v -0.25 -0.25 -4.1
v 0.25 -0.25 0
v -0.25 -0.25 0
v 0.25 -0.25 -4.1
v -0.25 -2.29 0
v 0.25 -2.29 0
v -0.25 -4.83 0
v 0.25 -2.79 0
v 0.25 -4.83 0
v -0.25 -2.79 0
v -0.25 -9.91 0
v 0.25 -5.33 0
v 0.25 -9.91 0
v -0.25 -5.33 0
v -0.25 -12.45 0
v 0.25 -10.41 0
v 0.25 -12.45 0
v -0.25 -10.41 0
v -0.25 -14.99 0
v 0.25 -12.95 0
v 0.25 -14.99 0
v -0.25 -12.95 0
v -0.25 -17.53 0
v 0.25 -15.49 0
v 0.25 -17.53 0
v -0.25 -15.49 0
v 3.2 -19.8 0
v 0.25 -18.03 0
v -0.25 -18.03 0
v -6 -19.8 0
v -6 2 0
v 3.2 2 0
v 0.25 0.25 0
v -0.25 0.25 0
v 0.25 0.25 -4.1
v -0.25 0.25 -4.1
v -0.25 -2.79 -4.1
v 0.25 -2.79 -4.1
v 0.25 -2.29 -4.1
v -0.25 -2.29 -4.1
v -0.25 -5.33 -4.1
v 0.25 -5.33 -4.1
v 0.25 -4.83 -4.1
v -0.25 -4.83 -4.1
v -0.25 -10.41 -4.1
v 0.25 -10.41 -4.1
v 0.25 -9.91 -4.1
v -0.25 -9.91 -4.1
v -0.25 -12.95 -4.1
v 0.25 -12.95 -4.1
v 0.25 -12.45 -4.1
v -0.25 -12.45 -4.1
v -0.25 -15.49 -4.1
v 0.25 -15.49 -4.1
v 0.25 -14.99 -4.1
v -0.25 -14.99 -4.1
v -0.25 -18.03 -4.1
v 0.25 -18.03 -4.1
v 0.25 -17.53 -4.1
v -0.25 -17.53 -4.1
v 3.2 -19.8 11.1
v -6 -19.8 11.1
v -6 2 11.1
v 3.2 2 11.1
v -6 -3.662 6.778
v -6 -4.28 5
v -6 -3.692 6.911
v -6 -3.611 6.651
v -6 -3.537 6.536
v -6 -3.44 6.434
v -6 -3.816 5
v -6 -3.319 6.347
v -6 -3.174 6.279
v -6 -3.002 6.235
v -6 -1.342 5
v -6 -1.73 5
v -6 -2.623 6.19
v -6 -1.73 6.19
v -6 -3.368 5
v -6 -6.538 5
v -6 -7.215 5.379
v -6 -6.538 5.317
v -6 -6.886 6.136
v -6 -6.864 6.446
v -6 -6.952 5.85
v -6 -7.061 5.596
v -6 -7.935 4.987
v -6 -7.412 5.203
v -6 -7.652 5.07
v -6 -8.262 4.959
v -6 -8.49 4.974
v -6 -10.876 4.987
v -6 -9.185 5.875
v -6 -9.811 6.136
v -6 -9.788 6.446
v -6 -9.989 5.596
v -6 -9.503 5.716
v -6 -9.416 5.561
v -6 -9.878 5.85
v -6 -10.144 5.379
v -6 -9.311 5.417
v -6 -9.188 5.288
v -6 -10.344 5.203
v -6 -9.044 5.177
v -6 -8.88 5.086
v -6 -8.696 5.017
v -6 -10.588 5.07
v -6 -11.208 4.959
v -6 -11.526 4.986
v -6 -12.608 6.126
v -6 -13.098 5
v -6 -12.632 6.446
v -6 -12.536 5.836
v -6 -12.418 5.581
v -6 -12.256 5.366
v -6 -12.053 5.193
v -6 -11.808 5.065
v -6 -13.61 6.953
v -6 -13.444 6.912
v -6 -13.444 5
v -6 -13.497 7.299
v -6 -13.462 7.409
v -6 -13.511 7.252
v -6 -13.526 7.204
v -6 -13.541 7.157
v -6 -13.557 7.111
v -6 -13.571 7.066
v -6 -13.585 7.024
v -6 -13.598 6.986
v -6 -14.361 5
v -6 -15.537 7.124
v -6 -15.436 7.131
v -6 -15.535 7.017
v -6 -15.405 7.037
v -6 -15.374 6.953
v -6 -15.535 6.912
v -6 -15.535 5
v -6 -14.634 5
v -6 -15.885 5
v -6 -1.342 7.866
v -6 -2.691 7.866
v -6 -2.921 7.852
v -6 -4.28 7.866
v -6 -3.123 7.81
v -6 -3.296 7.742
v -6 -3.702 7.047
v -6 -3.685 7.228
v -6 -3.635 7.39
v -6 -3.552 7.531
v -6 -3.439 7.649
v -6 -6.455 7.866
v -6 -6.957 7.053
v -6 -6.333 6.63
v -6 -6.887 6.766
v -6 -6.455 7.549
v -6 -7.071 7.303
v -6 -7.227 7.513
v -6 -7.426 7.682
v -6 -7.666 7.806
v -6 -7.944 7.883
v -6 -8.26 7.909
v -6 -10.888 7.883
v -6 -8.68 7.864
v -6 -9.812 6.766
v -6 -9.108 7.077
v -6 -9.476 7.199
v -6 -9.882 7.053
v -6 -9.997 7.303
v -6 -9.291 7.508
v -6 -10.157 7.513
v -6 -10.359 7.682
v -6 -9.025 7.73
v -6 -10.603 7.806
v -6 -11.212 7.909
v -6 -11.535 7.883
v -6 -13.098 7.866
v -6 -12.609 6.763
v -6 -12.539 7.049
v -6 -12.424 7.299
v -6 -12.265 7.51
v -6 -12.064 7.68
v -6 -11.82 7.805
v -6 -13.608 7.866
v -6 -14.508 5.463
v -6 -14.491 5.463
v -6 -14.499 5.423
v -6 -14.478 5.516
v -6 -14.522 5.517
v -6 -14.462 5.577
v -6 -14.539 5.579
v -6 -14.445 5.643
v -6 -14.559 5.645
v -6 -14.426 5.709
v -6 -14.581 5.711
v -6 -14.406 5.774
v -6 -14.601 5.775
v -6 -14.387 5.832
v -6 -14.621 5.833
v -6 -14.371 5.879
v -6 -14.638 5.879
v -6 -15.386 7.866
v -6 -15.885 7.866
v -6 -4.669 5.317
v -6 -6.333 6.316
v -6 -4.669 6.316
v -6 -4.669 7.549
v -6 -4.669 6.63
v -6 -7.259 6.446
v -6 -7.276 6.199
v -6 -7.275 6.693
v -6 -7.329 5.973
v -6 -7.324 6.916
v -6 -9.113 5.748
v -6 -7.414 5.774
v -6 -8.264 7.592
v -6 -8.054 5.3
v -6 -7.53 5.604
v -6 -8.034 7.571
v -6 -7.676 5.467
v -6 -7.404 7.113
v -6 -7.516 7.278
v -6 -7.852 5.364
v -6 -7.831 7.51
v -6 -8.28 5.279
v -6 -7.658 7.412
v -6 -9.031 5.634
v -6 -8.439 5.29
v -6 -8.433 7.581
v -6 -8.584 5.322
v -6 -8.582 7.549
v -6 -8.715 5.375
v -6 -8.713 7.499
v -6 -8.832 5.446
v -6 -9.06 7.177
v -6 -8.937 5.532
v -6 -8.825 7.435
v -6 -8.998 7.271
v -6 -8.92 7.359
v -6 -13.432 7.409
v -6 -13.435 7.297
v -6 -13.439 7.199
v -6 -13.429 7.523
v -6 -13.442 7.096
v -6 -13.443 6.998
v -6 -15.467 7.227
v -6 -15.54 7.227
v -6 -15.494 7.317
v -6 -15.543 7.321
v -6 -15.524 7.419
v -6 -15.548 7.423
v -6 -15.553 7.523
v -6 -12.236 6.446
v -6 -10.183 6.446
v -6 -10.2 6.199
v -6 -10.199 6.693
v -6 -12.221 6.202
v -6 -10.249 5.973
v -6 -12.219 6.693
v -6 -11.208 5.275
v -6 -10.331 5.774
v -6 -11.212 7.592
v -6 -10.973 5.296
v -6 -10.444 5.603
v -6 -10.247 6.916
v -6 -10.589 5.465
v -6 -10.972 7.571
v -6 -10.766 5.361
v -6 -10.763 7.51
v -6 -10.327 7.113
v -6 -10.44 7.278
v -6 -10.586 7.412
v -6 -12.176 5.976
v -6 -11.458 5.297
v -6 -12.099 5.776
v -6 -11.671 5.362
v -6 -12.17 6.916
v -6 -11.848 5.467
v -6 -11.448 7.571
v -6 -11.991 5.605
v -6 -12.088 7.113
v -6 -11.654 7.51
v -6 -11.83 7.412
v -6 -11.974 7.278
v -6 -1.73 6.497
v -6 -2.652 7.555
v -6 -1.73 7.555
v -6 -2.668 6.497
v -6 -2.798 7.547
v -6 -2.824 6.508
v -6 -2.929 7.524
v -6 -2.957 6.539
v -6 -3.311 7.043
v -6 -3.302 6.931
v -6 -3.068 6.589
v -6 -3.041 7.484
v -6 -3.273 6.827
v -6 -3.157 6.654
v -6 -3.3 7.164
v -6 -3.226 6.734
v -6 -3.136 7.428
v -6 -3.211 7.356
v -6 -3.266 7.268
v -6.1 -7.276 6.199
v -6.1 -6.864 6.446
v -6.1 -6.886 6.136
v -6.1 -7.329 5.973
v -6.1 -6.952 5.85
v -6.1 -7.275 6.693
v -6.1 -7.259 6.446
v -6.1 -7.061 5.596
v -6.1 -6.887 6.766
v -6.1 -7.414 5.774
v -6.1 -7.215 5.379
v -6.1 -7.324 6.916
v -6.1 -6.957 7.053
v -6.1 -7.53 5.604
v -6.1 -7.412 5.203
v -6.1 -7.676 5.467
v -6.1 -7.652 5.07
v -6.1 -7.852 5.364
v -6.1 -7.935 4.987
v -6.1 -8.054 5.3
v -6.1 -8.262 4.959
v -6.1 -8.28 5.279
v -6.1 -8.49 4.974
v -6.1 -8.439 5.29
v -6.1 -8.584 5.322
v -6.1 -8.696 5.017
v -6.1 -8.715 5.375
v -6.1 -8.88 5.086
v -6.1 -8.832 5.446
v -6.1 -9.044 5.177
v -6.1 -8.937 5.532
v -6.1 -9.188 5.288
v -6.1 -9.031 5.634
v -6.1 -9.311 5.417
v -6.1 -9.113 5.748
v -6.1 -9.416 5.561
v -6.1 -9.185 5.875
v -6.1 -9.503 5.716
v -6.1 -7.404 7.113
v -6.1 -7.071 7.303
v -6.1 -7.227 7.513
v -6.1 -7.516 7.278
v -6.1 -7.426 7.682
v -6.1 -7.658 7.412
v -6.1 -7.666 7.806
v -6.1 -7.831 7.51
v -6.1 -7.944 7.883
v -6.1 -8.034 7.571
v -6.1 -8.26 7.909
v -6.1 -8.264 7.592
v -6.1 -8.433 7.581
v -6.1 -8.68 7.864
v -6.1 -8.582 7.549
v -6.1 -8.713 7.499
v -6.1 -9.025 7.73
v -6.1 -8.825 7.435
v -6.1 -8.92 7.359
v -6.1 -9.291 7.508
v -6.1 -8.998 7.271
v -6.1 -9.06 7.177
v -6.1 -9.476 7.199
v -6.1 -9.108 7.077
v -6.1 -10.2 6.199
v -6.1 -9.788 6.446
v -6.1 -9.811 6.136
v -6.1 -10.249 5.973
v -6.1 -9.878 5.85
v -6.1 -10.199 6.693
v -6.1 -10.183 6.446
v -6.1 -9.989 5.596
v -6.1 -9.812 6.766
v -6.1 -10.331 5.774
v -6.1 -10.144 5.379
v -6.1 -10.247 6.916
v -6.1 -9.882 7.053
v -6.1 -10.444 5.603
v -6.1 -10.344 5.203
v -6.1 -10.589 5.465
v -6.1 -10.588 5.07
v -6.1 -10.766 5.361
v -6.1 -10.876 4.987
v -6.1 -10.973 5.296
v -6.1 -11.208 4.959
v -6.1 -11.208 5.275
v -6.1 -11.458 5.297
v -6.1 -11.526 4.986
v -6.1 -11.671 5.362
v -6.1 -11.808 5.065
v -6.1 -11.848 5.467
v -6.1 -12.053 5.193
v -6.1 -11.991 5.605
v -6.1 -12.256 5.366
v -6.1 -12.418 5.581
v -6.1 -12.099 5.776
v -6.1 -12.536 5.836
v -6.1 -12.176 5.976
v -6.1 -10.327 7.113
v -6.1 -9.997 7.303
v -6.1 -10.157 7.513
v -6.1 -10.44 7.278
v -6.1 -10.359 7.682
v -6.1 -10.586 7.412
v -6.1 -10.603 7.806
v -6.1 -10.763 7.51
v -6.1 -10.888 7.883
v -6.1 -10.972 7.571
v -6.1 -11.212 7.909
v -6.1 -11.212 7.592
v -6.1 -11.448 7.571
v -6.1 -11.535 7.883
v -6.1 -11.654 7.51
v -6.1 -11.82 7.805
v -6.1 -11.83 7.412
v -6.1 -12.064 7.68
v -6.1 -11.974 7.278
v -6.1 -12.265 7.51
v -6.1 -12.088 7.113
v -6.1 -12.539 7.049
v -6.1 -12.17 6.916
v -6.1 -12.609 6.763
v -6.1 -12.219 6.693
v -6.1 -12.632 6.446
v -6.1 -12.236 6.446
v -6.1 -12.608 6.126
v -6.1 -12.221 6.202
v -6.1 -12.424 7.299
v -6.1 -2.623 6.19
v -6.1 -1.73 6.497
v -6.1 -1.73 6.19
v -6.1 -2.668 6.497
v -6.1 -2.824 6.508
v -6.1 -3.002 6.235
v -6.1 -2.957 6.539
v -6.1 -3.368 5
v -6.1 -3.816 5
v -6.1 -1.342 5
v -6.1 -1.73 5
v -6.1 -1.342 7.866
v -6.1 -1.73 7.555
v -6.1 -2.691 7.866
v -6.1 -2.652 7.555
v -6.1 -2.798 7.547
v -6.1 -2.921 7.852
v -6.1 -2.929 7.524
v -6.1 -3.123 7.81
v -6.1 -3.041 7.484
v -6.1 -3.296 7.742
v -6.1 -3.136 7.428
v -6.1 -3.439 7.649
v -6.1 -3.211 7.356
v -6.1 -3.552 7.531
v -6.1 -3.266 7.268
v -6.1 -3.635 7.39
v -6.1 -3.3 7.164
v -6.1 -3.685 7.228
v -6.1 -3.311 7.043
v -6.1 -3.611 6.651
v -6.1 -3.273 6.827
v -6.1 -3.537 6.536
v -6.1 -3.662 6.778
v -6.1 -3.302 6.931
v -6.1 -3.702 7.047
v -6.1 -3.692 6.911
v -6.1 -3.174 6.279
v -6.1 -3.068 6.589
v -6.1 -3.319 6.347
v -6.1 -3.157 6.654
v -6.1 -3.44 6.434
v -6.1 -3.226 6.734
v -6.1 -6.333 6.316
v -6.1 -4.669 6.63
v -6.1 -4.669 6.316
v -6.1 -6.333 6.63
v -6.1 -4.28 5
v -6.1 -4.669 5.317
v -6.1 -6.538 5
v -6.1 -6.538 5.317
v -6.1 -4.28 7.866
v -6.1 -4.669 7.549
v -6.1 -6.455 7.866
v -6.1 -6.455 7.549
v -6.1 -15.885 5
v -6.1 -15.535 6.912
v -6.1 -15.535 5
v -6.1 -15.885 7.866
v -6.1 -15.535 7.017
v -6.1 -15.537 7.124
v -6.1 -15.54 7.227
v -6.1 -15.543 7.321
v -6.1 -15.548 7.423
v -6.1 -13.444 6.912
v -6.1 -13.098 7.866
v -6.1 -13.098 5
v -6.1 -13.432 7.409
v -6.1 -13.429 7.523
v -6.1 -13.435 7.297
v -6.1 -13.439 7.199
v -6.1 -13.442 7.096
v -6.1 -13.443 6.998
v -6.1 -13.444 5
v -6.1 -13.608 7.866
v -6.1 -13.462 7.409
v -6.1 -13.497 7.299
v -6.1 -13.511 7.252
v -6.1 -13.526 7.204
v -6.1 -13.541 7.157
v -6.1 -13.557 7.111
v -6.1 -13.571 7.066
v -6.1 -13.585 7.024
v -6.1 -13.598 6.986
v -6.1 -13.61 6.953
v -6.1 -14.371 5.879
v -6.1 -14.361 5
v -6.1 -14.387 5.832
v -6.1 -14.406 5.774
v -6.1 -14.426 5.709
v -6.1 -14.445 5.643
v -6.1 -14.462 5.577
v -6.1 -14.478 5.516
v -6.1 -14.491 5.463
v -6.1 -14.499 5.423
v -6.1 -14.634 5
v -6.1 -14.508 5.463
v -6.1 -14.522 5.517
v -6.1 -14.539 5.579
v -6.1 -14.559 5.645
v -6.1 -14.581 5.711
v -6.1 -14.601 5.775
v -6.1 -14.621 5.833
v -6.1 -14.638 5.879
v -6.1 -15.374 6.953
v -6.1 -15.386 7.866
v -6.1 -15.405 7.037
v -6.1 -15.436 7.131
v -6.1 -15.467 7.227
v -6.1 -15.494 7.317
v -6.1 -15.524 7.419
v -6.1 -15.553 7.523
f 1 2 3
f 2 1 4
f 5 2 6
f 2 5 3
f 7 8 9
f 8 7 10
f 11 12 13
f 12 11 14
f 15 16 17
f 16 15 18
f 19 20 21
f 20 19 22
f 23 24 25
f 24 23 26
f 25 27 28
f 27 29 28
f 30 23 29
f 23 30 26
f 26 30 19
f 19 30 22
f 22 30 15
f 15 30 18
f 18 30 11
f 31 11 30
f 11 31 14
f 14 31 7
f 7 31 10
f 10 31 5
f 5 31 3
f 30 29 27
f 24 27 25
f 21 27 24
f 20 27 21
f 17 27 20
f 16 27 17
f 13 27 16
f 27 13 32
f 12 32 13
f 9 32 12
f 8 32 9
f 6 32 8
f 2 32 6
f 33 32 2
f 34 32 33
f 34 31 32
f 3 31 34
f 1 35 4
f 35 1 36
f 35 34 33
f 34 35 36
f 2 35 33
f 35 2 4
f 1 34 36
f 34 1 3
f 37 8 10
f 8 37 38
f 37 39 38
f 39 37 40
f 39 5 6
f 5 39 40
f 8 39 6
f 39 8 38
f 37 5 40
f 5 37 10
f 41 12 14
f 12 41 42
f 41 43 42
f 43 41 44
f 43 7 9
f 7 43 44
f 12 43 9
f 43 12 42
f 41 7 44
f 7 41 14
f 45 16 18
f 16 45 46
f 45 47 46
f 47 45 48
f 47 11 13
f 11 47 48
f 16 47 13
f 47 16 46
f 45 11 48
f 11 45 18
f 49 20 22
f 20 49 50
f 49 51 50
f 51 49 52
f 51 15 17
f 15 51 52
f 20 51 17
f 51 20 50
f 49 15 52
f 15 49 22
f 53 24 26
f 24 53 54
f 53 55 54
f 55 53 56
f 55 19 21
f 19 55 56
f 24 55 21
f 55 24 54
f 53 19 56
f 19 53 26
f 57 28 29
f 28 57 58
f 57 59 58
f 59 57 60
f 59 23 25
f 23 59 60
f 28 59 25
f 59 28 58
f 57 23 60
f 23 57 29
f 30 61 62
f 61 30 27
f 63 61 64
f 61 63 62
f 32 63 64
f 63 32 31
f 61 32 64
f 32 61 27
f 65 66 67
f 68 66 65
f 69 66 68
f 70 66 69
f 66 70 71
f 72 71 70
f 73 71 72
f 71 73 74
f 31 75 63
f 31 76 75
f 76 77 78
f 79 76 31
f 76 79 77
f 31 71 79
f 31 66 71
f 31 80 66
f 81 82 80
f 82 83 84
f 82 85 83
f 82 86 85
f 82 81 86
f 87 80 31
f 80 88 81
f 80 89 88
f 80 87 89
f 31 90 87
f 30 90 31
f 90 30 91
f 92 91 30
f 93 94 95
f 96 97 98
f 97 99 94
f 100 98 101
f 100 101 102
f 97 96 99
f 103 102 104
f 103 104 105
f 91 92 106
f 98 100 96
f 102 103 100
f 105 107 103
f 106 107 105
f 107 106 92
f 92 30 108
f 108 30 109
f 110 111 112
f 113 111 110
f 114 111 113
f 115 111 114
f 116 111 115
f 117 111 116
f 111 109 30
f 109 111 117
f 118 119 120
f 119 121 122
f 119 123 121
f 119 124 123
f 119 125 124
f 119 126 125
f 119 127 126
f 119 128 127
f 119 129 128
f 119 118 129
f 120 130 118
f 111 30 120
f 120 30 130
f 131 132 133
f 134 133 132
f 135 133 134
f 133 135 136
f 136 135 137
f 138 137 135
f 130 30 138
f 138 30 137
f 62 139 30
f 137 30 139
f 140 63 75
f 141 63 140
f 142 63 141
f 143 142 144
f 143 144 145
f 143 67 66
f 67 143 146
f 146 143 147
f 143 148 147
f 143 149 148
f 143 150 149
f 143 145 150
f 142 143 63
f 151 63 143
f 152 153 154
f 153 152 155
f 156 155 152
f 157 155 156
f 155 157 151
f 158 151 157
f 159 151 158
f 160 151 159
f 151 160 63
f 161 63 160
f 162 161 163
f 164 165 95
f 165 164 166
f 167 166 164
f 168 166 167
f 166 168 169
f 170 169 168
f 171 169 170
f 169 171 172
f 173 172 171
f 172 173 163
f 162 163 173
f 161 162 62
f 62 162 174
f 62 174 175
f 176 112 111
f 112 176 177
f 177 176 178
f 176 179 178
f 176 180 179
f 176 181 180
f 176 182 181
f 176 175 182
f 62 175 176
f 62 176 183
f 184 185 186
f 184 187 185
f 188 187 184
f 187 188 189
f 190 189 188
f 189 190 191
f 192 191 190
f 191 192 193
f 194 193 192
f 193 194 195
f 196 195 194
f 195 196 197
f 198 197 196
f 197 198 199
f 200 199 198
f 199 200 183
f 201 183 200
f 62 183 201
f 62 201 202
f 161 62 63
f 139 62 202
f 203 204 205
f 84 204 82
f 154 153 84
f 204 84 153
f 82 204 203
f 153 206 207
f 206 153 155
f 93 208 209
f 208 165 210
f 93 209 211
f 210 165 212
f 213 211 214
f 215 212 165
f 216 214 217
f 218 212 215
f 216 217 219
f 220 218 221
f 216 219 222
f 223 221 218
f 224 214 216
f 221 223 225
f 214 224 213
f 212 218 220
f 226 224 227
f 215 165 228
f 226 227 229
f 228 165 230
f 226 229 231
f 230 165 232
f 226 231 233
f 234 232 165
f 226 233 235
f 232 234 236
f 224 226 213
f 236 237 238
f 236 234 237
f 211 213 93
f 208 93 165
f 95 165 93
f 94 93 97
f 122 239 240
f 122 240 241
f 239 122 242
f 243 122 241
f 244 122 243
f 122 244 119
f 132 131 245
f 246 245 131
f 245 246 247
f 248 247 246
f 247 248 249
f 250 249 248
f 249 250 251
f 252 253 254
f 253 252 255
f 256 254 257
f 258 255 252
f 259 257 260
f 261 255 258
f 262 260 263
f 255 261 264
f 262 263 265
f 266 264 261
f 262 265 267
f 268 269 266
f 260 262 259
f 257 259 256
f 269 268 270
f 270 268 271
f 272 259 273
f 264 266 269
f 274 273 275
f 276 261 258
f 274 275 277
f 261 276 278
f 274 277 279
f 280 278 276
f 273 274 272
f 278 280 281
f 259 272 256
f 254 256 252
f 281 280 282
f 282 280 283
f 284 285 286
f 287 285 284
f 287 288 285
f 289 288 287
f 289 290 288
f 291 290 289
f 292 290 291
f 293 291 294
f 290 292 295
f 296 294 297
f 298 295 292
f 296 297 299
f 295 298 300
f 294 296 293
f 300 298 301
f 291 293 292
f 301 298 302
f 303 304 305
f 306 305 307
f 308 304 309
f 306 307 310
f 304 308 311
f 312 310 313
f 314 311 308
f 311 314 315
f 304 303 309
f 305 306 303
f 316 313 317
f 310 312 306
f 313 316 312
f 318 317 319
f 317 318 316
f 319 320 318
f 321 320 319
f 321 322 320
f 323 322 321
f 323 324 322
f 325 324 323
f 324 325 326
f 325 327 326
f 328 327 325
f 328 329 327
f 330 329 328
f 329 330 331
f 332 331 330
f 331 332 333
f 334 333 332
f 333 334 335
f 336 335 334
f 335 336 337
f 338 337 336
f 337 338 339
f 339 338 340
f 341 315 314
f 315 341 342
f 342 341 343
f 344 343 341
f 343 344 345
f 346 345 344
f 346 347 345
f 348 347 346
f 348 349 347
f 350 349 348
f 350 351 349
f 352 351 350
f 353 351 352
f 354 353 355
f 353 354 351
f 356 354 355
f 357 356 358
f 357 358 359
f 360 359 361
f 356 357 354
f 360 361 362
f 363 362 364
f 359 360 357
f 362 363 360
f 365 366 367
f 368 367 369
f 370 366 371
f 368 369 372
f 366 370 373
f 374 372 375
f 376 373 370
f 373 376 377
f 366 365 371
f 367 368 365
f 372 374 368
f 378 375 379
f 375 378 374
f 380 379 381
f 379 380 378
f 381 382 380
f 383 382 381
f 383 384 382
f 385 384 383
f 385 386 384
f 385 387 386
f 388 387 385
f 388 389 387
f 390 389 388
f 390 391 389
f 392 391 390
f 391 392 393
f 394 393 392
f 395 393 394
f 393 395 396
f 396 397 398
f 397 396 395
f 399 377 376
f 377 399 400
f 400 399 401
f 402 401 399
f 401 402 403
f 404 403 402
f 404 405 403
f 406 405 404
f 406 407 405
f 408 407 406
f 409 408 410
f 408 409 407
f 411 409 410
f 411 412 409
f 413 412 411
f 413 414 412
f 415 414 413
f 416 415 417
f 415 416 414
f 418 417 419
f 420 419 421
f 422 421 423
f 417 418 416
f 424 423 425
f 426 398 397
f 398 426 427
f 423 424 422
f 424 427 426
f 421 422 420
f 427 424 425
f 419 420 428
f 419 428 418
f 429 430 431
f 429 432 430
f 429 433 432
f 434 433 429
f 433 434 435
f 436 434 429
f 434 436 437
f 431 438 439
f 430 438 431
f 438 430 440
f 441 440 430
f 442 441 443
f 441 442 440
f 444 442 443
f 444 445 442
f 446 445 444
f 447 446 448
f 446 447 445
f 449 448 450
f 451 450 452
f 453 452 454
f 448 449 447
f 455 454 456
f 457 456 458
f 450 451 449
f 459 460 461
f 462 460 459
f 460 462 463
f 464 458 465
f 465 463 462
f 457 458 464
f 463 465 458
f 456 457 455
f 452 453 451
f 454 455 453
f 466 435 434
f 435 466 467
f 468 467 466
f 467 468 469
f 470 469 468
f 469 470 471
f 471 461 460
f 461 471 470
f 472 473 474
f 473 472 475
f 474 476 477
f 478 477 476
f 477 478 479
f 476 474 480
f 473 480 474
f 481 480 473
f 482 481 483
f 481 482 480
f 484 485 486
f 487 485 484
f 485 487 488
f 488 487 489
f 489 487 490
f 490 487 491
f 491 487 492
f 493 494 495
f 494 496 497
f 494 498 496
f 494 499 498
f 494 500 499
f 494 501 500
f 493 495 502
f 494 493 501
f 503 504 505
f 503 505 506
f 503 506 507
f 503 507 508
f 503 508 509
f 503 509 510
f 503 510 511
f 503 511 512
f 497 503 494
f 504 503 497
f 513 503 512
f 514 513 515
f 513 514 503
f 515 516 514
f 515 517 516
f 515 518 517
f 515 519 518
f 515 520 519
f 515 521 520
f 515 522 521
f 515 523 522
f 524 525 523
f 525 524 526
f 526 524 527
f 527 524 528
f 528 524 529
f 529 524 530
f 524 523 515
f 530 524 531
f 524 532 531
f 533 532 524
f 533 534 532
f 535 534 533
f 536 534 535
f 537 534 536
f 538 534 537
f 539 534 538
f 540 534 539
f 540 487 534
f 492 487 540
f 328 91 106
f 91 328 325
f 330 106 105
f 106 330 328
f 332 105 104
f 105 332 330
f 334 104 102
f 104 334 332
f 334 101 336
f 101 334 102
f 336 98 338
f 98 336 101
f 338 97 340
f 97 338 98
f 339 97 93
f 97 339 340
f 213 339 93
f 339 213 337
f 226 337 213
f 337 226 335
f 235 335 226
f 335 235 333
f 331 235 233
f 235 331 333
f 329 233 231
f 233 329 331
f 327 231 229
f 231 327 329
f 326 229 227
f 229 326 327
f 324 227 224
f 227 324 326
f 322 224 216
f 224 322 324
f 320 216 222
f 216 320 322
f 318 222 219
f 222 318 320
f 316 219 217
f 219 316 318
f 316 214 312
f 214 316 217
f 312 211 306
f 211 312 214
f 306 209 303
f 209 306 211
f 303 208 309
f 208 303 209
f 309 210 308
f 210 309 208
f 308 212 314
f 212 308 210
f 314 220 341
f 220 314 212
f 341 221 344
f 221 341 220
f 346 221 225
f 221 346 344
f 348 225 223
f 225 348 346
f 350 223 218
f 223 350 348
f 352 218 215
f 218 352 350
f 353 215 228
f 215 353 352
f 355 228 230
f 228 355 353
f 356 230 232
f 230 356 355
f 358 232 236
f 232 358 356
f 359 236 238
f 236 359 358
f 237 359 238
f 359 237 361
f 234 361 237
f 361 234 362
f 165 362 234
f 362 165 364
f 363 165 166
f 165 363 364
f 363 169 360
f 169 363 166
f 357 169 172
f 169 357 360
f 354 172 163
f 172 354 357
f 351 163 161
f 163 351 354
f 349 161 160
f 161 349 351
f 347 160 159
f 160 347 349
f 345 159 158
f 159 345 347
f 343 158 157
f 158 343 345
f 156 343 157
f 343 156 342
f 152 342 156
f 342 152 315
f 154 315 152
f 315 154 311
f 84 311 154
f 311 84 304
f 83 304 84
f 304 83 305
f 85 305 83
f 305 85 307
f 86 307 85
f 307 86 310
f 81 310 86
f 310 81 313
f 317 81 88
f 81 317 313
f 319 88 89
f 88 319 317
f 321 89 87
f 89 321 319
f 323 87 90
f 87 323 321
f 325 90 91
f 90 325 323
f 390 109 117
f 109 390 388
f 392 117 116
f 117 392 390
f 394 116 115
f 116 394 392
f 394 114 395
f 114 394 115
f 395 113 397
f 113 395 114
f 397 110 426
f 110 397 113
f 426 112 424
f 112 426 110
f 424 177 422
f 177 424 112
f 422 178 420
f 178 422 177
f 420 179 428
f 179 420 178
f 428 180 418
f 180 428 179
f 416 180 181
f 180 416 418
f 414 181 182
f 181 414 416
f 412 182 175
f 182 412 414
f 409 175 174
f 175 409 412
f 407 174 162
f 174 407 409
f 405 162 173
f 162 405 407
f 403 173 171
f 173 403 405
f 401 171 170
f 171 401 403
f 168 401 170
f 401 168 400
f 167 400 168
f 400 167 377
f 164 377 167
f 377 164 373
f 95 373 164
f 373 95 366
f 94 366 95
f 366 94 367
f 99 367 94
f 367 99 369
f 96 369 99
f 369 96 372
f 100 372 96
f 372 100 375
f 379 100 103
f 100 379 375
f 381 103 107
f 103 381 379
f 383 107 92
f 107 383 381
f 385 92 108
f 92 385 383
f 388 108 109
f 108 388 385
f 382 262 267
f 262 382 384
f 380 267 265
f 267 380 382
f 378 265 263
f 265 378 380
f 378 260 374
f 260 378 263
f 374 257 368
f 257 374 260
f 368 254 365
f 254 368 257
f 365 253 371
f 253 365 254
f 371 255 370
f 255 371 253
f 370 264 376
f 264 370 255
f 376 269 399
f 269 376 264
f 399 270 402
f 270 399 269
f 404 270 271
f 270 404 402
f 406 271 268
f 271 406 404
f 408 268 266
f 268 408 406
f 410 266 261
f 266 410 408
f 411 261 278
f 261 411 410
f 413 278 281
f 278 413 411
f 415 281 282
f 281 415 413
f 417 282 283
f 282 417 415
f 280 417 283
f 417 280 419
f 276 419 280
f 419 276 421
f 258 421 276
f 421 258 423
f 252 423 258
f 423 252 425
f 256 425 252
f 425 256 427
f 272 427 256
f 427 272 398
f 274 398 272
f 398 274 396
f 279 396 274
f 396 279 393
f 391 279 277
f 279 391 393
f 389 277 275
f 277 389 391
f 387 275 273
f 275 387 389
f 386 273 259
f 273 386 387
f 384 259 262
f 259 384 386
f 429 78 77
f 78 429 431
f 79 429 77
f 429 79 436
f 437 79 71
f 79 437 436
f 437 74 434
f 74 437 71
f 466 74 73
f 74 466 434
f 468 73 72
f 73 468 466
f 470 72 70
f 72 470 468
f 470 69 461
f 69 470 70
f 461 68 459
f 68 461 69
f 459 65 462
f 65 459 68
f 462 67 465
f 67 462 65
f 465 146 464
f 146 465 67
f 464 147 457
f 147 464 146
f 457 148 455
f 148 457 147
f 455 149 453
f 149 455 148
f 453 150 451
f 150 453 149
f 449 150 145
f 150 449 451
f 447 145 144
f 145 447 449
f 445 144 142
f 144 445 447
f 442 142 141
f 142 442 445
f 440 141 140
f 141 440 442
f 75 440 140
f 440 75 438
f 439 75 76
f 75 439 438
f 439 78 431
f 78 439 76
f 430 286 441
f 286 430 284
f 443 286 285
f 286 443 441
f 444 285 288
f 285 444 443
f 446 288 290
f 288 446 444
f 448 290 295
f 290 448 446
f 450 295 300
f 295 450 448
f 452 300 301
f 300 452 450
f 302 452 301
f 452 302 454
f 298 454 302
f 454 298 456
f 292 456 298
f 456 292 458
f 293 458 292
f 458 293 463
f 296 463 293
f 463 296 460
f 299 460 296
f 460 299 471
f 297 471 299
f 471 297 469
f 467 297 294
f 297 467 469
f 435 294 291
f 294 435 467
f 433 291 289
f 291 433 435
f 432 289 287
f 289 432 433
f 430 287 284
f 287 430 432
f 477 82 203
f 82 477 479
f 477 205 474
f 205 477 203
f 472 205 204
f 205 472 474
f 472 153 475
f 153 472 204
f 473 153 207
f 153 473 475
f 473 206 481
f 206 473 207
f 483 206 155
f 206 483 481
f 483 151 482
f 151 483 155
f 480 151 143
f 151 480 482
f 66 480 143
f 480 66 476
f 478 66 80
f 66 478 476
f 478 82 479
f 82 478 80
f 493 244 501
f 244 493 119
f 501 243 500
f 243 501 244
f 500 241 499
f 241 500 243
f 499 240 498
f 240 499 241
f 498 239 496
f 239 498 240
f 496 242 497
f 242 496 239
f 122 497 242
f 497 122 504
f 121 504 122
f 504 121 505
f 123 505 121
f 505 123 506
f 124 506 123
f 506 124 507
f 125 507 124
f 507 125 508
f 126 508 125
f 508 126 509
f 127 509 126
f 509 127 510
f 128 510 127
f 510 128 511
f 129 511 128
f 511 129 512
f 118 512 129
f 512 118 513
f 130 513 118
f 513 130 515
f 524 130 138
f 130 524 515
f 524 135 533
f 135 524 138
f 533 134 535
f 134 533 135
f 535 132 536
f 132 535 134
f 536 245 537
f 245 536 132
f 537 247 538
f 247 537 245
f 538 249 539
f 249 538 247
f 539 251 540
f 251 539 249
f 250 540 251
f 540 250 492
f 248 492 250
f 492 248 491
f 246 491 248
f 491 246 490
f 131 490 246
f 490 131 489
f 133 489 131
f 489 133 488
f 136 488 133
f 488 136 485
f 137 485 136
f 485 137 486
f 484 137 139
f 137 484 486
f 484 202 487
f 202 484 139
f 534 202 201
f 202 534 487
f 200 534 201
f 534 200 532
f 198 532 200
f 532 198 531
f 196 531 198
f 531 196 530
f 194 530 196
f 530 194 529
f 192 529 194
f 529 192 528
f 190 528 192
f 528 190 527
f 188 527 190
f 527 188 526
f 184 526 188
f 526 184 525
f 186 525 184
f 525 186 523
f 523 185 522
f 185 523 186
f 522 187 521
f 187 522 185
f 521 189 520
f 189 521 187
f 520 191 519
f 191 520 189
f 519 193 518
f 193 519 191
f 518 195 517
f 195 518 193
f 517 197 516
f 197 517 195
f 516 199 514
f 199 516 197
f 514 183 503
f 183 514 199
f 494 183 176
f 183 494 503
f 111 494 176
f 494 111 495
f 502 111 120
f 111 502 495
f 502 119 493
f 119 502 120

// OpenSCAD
module pin(n) {
    translate([2.54*(n-1), 0, 0])translate([-0.25,-0.25,-4.1])cube([0.5,0.5,4.1]);
}

rotate([0,0,-90])
{
    color("darkgrey")translate([-2,-9.2+3.2,0])cube([21.8, 9.2, 11.1]);
    color("white")translate([1,-9.2+3.2+0.9,5])rotate([90,0,0])linear_extrude(1)text(text="RECOM", size=3);
    for (a = [1,2,3,5,6,7,8]) pin(a);
}
